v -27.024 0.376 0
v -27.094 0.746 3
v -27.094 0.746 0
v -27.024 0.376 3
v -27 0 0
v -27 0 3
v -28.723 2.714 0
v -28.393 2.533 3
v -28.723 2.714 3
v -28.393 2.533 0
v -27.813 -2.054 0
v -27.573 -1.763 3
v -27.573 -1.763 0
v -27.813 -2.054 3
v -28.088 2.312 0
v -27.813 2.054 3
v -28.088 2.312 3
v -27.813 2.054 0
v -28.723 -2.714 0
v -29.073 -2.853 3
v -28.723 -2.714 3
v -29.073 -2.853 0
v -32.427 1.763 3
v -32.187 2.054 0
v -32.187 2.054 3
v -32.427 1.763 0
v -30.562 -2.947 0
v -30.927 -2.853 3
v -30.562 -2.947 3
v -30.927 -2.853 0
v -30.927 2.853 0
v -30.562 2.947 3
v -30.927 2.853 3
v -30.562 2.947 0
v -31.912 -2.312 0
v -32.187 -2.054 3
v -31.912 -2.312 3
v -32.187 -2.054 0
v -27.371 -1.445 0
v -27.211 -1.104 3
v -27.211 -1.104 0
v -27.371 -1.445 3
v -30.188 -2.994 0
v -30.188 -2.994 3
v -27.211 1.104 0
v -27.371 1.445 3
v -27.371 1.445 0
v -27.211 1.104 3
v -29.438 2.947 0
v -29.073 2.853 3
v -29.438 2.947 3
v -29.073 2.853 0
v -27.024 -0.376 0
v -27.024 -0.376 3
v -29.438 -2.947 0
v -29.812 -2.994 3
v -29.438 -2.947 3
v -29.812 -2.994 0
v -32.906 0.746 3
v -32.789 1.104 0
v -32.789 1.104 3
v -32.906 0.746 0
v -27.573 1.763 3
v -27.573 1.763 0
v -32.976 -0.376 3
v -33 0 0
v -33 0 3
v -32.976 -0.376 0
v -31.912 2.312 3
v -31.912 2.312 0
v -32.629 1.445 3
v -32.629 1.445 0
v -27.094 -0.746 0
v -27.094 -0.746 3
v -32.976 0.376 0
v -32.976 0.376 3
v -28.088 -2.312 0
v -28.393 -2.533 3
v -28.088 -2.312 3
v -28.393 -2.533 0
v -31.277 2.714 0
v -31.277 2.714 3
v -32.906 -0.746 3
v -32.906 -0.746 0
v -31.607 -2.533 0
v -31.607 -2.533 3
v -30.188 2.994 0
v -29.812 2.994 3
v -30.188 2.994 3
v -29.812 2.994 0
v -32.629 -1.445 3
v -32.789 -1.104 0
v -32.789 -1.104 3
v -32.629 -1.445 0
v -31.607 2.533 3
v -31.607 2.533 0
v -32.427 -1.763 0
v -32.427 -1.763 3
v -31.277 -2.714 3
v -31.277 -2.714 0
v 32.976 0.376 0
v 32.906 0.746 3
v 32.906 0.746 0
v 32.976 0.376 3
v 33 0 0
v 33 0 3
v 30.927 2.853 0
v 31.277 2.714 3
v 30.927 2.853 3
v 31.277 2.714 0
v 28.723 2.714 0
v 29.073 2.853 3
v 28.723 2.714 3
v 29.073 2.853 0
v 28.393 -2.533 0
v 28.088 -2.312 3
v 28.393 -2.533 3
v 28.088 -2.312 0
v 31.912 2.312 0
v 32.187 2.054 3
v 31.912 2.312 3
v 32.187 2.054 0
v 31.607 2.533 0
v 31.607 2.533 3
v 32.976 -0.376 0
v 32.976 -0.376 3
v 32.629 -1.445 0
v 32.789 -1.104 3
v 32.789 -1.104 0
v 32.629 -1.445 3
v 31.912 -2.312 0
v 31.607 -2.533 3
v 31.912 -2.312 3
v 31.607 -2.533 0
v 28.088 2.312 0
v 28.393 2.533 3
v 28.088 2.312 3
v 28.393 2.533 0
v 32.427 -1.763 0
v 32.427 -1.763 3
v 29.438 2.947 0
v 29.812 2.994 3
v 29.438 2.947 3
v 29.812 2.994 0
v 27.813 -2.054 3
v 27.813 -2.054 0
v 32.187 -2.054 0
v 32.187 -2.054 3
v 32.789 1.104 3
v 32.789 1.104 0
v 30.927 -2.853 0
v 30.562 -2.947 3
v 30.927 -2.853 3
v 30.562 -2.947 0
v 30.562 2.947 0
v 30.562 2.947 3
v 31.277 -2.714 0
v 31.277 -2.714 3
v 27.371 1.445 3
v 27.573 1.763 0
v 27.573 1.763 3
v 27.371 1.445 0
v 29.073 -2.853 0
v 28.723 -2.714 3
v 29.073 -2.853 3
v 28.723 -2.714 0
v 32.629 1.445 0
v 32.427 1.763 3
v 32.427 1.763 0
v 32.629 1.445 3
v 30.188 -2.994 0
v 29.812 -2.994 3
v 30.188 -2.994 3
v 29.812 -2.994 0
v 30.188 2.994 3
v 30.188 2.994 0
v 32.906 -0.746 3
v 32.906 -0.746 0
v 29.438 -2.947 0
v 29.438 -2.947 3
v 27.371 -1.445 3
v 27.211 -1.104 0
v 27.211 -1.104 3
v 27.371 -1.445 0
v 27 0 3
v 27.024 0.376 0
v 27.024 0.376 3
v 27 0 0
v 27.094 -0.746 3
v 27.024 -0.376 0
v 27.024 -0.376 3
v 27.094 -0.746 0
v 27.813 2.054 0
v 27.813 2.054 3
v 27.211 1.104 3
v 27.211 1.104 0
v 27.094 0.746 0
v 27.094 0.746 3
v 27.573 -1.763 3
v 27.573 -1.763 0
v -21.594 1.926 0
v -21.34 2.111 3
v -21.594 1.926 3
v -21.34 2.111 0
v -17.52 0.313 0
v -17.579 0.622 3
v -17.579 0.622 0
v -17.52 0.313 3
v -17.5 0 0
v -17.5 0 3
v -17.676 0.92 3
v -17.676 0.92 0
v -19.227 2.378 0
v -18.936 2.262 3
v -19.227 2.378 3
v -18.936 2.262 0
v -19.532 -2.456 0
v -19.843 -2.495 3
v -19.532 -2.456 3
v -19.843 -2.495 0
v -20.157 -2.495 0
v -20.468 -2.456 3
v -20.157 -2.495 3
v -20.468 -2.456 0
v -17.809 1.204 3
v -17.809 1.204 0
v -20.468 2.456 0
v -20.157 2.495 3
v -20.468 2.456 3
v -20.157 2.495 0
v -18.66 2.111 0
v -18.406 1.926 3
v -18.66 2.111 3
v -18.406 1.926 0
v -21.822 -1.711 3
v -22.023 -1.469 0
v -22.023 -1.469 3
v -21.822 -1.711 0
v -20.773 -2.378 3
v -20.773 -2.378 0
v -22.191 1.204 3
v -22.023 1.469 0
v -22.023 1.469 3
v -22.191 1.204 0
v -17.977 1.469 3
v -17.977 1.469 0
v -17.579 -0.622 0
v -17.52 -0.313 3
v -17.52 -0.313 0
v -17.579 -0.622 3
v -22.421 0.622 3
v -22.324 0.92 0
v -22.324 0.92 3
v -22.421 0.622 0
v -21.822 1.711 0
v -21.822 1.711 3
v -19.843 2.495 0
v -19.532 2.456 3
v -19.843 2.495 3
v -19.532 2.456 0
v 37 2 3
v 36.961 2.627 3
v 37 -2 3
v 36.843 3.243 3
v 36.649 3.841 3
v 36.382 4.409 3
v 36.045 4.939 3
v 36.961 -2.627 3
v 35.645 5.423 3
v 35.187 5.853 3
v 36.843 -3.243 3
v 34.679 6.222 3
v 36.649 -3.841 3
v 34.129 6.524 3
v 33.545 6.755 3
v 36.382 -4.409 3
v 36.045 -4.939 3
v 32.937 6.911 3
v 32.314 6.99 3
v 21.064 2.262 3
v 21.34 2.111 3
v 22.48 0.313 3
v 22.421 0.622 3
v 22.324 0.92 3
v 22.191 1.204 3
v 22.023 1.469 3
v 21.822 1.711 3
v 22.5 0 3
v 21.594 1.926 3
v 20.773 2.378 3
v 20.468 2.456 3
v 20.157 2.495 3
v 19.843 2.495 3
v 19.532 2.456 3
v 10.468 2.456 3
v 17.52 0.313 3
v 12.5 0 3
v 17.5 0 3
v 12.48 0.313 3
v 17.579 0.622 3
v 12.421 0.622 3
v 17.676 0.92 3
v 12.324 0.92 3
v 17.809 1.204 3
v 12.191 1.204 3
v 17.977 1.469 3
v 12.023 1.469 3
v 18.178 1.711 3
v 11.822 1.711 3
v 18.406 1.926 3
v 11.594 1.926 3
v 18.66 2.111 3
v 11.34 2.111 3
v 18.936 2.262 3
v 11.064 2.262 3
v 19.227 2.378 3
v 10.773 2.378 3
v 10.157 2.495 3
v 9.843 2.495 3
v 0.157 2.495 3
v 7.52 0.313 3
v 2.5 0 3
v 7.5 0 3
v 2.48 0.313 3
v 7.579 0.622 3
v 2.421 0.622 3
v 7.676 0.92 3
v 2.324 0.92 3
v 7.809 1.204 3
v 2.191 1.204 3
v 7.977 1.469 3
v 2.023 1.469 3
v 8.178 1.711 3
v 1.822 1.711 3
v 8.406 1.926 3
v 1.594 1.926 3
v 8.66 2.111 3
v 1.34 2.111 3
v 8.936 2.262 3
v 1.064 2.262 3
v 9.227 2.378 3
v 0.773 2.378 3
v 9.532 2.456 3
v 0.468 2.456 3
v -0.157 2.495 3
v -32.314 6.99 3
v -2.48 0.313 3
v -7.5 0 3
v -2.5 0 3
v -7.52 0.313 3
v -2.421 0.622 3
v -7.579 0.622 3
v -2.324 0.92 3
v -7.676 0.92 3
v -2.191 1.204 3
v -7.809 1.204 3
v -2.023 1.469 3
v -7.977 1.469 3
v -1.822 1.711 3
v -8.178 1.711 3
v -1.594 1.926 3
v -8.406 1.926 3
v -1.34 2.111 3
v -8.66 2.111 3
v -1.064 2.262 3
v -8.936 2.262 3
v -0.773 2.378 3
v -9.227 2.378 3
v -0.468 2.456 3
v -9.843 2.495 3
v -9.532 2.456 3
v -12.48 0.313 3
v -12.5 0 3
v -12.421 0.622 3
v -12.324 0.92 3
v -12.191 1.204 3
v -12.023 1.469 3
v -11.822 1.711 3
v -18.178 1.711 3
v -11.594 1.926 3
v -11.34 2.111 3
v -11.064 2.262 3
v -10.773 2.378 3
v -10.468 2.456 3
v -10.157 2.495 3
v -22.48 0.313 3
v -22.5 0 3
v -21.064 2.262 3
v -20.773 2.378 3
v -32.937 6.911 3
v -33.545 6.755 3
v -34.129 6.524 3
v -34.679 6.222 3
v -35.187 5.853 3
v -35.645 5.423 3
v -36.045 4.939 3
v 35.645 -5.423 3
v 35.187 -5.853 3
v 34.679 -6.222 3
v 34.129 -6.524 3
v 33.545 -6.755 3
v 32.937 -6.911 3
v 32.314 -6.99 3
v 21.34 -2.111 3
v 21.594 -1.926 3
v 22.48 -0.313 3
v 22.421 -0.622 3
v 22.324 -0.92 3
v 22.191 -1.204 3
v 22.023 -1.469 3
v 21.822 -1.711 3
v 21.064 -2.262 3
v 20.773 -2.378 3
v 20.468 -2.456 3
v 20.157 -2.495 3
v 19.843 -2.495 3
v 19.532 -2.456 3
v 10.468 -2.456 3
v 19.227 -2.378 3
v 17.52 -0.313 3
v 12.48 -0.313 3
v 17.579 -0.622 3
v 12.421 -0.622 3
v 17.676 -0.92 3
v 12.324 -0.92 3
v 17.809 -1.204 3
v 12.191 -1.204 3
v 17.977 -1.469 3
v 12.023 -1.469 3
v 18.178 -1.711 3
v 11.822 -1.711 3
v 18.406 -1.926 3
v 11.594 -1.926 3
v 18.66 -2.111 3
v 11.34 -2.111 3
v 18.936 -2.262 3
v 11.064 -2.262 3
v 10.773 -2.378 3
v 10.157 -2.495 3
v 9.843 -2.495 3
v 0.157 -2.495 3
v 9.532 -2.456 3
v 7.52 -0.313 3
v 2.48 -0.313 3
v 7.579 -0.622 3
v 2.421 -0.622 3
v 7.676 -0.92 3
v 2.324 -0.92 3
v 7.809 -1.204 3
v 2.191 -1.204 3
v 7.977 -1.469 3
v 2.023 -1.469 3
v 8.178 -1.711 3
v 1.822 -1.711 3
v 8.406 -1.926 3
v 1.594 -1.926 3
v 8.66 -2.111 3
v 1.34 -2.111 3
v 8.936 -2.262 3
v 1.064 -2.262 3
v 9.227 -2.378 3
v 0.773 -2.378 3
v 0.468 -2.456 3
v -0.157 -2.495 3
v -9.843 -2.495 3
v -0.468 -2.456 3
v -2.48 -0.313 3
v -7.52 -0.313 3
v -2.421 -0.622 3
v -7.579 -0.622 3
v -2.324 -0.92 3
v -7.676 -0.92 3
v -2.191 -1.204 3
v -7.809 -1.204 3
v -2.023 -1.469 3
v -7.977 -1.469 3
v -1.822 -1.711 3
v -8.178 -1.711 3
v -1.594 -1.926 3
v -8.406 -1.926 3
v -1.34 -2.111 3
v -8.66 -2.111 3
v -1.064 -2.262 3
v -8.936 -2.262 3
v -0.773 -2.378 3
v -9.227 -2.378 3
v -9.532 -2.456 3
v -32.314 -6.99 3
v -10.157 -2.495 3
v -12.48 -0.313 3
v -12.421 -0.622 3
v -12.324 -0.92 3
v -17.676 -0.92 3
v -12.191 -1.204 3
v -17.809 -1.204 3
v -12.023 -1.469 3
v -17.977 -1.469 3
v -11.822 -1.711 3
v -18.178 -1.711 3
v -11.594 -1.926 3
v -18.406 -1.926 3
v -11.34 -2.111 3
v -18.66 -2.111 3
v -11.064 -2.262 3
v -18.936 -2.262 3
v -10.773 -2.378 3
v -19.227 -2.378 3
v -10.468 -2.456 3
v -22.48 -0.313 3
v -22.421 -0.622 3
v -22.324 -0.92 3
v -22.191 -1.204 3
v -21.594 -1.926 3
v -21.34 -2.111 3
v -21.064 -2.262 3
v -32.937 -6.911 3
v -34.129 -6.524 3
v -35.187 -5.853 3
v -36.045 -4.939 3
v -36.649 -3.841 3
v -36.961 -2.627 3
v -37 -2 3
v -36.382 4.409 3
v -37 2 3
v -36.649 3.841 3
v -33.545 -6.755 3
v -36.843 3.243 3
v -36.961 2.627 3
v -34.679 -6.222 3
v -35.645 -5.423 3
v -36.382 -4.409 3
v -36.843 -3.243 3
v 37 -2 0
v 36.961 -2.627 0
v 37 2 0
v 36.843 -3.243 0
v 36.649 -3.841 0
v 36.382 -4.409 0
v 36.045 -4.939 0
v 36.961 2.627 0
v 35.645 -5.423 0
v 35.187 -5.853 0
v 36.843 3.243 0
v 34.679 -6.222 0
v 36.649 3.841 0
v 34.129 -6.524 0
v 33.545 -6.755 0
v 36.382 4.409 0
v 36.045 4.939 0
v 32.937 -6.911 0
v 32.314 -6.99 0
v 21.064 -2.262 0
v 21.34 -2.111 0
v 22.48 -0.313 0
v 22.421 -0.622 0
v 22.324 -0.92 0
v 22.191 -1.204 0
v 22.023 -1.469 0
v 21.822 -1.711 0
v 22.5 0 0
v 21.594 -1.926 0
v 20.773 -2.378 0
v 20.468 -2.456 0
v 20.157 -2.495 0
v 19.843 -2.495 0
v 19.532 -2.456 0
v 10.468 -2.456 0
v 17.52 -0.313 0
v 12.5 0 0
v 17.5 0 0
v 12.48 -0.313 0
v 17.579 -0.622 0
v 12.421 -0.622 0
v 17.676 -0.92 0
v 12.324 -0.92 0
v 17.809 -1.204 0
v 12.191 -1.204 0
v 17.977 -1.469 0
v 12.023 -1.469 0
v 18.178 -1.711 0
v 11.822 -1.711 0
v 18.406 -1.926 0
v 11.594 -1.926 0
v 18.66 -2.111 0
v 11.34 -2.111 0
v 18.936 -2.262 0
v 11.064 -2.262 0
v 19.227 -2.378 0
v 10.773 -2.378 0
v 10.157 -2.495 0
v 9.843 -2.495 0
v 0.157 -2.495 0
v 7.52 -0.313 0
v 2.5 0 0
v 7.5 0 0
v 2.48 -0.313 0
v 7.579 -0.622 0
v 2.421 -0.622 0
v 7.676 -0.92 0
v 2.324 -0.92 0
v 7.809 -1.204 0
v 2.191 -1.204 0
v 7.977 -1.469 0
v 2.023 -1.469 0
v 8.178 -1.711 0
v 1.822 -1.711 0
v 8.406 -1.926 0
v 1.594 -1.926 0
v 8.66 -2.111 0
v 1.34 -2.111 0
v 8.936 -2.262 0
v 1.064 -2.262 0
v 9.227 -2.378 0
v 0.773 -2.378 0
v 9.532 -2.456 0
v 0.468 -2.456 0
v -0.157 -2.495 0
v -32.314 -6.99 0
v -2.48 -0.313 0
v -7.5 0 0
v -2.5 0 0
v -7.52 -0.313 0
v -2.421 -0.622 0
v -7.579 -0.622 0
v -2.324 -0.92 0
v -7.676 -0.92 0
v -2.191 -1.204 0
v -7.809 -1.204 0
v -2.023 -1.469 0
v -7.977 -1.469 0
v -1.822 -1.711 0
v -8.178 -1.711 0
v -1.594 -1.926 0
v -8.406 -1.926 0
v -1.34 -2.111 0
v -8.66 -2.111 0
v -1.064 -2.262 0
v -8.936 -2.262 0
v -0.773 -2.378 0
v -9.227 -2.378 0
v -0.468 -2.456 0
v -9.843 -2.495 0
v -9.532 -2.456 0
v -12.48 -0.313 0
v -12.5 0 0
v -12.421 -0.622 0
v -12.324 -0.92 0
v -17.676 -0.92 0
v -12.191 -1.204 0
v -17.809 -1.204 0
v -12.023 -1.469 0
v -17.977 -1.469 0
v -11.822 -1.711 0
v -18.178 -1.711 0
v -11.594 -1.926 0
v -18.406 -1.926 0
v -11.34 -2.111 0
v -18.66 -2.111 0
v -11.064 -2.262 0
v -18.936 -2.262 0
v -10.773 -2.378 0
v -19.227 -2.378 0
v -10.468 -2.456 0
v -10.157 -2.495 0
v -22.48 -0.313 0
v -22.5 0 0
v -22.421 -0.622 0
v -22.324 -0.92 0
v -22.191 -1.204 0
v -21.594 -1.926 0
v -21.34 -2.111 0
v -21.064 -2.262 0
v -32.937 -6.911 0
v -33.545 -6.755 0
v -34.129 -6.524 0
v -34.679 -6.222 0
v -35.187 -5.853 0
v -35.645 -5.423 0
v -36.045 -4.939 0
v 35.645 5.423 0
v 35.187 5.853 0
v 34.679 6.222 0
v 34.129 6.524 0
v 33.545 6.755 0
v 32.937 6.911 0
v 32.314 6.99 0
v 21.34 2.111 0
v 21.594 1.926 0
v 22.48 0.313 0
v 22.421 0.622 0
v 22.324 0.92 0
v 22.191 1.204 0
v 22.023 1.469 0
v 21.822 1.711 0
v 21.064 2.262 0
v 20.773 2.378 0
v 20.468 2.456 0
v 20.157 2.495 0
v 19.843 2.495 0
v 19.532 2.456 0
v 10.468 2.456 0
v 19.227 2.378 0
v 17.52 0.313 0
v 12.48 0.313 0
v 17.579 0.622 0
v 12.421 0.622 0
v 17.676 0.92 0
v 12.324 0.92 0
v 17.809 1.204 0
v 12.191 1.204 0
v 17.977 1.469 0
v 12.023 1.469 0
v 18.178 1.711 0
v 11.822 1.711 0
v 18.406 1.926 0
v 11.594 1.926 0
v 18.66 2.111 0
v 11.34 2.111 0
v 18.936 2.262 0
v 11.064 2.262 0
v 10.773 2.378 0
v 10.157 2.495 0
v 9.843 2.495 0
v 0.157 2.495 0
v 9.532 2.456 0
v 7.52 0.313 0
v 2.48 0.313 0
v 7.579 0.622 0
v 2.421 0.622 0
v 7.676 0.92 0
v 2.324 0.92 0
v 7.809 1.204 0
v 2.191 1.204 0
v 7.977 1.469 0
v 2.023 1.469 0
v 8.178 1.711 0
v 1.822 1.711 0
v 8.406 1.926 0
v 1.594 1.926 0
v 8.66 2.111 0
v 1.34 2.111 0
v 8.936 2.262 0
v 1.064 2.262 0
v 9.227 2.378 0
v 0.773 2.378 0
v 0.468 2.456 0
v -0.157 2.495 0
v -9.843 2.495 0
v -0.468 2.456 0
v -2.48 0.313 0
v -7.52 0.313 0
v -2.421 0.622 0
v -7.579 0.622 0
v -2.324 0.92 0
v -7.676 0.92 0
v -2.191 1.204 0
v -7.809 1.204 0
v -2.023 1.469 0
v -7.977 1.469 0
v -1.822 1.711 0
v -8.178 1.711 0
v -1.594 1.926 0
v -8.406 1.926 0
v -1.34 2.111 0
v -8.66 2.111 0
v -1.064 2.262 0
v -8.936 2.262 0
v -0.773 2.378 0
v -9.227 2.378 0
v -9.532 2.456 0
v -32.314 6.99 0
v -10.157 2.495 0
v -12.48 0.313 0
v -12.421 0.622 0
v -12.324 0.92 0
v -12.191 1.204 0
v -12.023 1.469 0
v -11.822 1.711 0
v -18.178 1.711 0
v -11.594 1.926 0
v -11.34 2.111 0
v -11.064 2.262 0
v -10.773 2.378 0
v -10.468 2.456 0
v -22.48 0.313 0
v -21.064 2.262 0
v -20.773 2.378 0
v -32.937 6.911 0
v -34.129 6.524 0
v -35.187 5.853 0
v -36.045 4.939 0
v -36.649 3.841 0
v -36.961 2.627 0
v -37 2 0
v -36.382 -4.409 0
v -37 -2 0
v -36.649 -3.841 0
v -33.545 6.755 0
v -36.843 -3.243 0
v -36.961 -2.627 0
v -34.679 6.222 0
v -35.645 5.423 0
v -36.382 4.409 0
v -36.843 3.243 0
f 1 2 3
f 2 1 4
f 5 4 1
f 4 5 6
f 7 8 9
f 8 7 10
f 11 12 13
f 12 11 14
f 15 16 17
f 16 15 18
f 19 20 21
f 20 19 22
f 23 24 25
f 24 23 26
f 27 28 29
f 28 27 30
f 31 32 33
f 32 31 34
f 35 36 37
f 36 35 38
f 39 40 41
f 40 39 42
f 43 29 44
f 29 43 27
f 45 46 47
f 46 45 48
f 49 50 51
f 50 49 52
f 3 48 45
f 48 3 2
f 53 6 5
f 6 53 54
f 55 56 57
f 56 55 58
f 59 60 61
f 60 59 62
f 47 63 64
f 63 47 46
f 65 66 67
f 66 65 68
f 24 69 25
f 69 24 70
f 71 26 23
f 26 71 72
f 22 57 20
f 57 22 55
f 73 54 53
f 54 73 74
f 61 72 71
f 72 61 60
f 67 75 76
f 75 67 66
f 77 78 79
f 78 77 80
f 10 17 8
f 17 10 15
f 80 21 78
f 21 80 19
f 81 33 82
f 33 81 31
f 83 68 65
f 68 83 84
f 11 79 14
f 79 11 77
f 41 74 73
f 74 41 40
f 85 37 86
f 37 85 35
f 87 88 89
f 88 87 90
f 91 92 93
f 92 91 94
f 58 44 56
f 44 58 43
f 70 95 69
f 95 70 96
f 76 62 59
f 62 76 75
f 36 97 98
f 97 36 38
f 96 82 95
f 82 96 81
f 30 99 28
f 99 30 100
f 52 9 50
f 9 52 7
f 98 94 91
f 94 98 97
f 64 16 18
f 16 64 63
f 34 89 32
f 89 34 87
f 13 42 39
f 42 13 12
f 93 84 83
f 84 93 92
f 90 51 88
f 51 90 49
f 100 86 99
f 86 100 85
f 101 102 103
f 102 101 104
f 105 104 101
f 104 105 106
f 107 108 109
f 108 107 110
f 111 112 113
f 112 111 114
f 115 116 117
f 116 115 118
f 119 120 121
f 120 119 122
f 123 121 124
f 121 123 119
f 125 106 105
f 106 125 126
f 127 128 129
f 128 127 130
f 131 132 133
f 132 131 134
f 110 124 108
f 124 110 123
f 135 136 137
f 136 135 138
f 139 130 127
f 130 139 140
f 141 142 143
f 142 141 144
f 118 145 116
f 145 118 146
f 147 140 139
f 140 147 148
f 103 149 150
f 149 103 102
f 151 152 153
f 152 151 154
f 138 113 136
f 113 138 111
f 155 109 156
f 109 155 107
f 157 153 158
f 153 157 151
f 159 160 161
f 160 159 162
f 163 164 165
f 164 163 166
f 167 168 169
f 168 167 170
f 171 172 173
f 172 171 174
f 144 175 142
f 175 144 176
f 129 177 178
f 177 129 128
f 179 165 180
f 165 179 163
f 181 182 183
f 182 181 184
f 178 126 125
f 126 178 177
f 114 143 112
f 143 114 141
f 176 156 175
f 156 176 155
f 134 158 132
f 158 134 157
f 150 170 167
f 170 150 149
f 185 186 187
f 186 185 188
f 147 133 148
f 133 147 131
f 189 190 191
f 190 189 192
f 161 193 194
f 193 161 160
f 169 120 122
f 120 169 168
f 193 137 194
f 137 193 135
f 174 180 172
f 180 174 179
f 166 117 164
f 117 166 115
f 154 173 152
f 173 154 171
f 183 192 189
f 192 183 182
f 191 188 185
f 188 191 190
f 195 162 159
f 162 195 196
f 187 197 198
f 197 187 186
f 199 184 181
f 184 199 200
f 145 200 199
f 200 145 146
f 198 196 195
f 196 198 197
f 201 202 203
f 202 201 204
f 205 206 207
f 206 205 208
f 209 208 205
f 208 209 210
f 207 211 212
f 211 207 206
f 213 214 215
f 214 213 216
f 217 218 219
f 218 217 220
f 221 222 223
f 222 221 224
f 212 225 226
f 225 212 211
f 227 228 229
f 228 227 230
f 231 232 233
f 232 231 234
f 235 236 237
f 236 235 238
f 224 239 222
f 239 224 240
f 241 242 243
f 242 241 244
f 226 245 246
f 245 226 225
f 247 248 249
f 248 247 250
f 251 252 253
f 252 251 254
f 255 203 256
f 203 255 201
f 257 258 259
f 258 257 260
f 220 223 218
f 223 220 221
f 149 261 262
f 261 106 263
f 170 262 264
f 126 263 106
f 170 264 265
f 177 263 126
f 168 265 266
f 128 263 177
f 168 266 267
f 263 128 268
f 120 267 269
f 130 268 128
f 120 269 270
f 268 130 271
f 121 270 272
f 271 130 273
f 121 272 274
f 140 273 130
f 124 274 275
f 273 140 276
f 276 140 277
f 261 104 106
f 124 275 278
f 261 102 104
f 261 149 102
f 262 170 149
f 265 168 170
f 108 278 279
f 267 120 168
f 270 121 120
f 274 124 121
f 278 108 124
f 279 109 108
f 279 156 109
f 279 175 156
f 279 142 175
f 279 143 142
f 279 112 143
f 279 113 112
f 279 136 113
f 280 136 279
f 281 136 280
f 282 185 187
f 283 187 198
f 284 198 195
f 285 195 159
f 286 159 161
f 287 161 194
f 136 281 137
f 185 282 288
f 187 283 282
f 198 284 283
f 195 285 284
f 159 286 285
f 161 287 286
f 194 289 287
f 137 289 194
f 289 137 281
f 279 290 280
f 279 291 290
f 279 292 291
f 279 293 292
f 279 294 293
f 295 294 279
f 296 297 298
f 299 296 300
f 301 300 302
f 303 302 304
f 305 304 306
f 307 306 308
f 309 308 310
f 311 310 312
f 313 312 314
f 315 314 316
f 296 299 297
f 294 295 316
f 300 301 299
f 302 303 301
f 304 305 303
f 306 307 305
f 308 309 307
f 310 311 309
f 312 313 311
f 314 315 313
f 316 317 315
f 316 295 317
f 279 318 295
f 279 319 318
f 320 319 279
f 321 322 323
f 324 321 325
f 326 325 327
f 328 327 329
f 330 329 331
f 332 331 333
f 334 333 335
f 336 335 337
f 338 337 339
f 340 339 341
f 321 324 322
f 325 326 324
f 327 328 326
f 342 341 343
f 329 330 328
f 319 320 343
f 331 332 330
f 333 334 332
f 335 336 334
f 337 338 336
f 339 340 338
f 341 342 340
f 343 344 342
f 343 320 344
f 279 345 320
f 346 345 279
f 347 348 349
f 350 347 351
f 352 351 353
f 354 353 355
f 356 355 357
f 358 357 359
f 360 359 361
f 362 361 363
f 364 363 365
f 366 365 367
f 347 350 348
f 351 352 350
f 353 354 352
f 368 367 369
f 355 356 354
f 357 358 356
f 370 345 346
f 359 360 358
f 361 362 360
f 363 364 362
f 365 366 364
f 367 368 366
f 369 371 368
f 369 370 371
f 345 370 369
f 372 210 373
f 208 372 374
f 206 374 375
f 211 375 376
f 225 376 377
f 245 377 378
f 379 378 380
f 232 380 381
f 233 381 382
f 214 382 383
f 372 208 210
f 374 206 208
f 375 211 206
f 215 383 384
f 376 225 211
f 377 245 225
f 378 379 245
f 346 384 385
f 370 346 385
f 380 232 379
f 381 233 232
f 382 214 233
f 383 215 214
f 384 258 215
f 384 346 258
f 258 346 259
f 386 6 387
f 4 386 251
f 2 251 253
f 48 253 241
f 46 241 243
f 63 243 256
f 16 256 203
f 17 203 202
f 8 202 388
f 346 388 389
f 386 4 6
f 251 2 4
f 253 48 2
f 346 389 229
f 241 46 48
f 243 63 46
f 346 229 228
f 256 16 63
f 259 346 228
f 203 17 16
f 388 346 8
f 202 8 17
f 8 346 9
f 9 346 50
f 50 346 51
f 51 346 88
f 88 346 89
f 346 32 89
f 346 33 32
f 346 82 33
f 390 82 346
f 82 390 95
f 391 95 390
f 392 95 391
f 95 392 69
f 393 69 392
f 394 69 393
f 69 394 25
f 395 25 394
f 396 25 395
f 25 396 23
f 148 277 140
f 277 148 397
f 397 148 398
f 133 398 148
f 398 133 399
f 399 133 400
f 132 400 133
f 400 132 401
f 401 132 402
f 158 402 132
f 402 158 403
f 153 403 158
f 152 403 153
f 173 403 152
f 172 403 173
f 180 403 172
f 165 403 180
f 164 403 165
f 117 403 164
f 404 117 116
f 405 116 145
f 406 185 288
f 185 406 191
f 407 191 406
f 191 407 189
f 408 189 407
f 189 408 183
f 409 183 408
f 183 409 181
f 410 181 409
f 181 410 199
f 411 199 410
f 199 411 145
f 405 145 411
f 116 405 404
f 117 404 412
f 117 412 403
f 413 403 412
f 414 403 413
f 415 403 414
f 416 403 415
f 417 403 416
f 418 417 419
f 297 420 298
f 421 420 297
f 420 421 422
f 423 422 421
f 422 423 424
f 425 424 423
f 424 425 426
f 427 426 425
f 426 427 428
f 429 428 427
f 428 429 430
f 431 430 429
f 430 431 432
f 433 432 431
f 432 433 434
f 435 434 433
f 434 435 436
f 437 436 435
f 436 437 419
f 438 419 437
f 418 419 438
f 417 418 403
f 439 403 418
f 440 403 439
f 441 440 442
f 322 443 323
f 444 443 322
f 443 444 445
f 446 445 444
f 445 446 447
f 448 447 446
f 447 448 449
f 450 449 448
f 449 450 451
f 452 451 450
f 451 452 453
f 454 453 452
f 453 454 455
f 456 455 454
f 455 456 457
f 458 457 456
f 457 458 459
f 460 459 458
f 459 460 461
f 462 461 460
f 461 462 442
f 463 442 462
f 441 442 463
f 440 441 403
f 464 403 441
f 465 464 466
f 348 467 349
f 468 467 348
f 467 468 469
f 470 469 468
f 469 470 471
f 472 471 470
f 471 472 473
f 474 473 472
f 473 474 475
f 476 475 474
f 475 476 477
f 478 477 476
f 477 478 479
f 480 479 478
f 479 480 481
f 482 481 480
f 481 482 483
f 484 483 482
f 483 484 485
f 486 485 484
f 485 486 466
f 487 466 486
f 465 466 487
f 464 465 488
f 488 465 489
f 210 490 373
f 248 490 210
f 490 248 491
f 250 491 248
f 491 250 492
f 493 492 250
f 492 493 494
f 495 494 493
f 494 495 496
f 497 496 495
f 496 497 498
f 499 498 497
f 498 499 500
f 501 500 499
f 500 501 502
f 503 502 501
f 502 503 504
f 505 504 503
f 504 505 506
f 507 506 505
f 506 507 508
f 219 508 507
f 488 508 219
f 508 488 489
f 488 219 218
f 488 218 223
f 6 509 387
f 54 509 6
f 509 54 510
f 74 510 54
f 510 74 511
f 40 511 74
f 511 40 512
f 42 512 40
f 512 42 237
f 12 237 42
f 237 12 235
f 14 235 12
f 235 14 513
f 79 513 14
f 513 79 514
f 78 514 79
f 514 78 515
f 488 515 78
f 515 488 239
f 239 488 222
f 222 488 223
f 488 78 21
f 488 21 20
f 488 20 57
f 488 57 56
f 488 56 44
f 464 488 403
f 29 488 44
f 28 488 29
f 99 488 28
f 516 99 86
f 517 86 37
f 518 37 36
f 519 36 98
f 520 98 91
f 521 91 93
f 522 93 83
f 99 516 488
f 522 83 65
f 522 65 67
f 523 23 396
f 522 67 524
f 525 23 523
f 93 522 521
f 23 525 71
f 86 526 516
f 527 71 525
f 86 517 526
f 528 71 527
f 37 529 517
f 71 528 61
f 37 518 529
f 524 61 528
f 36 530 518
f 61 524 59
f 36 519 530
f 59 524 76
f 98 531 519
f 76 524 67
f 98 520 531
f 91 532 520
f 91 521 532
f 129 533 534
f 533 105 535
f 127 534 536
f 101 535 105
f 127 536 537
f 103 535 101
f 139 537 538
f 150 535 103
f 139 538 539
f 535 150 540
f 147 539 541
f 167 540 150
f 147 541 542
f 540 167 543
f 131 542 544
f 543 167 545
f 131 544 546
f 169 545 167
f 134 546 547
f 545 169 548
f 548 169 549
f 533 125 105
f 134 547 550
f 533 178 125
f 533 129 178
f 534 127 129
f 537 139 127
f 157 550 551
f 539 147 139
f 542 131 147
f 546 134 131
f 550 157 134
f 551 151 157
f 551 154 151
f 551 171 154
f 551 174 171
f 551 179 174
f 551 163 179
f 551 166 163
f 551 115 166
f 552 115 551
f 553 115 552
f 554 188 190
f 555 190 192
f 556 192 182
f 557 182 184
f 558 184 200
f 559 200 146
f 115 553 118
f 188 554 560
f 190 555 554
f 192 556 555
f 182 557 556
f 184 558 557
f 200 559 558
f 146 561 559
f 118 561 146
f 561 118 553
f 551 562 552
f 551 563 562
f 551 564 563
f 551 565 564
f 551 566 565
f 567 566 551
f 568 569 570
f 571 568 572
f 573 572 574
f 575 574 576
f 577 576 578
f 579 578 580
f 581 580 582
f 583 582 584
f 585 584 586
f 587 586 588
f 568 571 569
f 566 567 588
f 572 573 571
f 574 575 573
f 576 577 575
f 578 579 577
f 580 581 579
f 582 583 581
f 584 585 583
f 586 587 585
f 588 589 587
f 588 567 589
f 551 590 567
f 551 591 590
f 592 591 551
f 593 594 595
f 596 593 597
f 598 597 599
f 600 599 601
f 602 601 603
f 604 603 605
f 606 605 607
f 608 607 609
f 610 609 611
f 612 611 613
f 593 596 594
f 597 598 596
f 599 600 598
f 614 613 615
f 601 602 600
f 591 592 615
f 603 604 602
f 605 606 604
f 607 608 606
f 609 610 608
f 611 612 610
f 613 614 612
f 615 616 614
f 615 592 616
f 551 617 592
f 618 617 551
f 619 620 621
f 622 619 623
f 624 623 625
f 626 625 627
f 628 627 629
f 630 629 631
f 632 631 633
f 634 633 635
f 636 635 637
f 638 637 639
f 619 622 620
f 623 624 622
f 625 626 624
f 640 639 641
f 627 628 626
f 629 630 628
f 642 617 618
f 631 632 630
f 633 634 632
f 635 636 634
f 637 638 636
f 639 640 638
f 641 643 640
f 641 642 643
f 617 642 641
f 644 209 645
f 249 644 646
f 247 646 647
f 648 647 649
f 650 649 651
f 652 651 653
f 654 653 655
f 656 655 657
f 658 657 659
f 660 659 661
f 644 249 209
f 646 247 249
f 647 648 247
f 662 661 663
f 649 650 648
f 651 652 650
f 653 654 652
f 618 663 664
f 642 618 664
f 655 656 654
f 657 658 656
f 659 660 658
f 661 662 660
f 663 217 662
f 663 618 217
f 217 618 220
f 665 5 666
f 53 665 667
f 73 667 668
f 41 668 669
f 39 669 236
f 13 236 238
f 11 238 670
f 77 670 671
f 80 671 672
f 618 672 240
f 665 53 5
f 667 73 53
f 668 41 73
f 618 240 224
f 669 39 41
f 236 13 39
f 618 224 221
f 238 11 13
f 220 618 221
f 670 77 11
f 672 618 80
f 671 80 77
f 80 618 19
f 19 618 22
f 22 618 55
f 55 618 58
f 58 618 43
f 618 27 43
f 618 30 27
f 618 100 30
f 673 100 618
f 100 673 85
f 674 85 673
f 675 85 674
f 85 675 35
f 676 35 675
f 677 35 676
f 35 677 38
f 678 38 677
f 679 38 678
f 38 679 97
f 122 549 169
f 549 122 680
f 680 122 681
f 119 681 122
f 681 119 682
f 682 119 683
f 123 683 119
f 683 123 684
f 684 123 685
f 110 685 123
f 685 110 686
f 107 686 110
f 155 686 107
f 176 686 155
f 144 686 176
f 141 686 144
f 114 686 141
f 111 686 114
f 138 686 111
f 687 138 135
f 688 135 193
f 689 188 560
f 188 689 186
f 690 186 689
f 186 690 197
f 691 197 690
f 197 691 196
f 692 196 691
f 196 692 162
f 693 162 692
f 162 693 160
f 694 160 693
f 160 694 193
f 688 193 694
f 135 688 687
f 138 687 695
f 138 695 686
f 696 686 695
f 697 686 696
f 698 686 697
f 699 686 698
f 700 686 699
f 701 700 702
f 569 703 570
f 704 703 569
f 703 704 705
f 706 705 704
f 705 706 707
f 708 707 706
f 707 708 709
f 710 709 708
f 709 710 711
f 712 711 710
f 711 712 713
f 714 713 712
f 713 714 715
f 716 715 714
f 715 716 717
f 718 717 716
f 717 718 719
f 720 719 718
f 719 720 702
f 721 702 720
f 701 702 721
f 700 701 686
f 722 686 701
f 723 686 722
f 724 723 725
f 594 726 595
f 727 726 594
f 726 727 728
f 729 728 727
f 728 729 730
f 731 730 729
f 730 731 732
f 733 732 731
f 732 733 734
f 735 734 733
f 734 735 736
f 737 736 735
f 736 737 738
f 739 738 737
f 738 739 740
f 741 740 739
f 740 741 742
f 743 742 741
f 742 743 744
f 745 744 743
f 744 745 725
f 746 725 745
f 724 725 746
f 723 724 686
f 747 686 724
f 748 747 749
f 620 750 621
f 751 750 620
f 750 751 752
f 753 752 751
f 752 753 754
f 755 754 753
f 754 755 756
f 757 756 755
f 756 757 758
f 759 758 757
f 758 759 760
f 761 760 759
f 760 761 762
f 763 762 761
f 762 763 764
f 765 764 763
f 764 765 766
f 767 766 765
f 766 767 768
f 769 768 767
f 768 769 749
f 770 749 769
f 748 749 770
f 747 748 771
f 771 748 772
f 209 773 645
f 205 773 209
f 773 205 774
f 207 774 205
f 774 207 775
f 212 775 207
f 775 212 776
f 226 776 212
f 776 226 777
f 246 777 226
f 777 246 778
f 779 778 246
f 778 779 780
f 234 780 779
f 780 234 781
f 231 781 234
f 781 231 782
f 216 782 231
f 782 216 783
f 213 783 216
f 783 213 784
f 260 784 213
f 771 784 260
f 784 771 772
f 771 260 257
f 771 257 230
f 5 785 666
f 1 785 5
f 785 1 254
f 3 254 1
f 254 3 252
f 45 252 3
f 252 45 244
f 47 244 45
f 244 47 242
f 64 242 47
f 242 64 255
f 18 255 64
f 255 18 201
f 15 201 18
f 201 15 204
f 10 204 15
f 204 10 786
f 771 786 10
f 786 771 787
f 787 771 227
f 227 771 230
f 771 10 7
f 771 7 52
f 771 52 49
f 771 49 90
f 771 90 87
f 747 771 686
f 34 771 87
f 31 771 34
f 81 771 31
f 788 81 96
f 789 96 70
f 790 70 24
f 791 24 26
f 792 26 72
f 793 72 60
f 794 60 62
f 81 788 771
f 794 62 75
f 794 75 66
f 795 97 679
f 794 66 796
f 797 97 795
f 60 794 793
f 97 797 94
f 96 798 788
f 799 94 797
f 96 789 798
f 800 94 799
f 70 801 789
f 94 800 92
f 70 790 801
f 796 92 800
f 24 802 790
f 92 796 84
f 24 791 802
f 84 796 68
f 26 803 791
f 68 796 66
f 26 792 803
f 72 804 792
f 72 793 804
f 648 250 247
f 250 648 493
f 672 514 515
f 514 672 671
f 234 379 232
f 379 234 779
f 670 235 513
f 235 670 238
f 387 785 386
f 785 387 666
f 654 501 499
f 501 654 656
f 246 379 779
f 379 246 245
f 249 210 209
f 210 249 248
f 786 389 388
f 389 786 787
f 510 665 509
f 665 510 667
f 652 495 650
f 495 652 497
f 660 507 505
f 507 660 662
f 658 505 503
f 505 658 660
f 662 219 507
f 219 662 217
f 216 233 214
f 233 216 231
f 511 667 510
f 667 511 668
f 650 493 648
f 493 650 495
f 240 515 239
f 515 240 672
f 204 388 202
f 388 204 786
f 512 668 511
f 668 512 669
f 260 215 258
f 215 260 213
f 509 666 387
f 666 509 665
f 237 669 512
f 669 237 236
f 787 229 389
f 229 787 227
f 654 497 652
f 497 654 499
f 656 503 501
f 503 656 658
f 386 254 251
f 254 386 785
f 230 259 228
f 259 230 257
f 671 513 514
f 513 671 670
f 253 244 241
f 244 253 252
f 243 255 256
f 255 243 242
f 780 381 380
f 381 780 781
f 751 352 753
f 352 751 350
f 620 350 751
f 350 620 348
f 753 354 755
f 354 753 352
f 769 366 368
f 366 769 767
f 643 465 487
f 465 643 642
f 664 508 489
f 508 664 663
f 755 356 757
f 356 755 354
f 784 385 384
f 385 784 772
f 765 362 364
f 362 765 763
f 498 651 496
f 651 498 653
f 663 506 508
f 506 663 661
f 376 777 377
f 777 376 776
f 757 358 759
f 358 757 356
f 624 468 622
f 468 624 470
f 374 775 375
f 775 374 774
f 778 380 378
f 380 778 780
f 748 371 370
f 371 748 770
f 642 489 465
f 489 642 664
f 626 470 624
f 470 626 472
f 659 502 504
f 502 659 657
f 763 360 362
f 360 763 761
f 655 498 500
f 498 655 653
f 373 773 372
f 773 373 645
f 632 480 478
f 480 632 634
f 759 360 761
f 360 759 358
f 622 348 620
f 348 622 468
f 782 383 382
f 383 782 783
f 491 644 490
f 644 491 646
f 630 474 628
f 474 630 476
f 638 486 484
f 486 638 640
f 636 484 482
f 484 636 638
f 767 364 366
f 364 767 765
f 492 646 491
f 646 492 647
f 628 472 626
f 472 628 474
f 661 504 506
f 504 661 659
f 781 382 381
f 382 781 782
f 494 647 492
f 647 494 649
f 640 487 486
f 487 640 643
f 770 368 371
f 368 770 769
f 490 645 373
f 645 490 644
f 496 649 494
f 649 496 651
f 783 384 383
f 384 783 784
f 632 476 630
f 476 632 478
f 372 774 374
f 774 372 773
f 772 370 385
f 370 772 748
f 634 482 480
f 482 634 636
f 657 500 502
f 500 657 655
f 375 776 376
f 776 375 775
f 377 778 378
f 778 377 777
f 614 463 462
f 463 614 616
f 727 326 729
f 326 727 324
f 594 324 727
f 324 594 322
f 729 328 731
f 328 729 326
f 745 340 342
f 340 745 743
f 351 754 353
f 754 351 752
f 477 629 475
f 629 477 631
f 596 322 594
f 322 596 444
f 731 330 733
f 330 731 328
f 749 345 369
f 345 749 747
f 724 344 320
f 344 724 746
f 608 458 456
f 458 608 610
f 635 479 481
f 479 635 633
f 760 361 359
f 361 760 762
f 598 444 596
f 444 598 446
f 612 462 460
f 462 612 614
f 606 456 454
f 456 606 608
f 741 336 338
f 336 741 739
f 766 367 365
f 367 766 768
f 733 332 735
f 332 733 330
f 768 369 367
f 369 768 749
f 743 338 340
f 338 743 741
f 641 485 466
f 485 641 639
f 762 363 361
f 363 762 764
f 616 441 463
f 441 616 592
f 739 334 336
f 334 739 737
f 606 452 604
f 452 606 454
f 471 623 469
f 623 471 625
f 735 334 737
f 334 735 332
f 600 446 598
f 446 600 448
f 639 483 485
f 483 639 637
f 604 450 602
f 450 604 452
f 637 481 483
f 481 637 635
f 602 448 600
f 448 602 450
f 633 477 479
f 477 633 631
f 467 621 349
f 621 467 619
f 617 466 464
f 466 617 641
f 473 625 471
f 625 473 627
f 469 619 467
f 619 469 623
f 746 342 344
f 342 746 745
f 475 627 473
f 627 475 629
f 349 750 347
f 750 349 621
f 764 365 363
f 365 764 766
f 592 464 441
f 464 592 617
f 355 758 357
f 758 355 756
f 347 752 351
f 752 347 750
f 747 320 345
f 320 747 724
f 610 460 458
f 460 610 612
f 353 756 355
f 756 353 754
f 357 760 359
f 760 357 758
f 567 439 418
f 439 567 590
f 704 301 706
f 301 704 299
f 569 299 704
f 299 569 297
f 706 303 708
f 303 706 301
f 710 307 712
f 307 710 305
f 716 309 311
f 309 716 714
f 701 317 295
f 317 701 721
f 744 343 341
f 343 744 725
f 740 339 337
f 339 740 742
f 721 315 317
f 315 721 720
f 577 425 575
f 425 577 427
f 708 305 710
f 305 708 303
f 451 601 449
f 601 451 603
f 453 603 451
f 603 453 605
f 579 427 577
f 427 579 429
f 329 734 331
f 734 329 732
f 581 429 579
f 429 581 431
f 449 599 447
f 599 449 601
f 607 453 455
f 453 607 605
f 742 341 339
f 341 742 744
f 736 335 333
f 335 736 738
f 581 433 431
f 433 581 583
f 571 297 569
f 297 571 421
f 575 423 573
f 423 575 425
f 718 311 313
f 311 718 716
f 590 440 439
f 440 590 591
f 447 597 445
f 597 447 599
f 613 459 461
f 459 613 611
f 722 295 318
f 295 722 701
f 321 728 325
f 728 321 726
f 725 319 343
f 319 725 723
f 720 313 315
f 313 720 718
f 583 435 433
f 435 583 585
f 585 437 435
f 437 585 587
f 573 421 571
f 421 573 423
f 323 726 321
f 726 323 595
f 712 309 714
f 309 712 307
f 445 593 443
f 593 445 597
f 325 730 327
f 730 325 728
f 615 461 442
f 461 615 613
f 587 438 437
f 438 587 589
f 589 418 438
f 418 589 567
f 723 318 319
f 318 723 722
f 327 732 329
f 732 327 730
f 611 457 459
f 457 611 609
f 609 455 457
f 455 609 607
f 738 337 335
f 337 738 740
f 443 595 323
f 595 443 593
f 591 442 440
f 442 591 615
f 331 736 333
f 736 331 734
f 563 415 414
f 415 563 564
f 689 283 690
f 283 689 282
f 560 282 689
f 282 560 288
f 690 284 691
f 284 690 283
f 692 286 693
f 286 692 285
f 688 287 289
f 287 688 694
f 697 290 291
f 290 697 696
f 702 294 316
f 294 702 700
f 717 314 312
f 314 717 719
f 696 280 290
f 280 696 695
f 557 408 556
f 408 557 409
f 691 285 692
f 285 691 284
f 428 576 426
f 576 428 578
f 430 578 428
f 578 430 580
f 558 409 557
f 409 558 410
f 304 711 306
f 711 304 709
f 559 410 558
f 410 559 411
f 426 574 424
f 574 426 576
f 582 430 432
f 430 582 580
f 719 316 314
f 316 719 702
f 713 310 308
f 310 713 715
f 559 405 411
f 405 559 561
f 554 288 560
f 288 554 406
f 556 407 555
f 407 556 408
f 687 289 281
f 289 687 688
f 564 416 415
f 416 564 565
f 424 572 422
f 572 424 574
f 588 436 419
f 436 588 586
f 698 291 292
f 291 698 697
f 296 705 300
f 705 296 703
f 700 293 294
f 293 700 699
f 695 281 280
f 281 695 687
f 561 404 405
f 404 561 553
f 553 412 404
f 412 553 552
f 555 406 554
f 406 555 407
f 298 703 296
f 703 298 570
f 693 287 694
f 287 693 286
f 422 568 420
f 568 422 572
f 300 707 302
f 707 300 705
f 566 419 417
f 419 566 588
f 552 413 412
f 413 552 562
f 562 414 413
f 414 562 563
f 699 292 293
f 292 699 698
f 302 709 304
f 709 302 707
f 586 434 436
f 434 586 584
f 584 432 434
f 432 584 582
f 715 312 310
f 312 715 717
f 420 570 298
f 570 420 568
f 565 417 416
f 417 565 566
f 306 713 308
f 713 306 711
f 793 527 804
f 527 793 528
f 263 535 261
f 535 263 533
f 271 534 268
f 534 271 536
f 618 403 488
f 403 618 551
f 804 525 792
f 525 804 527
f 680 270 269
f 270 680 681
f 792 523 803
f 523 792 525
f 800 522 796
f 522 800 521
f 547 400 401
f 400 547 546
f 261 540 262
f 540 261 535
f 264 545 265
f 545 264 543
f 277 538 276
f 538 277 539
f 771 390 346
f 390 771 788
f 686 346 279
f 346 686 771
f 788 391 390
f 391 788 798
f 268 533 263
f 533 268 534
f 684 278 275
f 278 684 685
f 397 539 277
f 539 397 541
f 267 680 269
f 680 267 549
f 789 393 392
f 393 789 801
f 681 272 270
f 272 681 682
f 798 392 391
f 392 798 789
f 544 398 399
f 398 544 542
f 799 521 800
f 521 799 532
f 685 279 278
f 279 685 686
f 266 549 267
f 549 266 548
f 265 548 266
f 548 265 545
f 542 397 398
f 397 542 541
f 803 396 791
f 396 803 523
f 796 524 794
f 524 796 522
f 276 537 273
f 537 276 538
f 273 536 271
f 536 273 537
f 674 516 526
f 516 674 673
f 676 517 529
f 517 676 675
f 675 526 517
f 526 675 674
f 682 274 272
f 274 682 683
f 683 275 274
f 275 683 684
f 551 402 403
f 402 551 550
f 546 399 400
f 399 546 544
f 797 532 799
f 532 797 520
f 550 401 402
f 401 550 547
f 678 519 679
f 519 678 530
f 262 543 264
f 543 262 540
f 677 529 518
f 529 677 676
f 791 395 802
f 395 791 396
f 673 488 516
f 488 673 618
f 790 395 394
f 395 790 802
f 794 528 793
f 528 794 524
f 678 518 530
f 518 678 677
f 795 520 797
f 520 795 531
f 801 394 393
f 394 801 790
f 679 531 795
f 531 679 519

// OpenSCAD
$fn = 50;


difference() {
	union() {
		hull() {
			translate(v = [-32.0000000000, 2.0000000000, 0]) {
				cylinder(h = 3, r = 5);
			}
			translate(v = [32.0000000000, 2.0000000000, 0]) {
				cylinder(h = 3, r = 5);
			}
			translate(v = [-32.0000000000, -2.0000000000, 0]) {
				cylinder(h = 3, r = 5);
			}
			translate(v = [32.0000000000, -2.0000000000, 0]) {
				cylinder(h = 3, r = 5);
			}
		}
	}
	union() {
		#translate(v = [-30.0000000000, 0.0000000000, 0]) {
			cylinder(h = 3, r = 3.0000000000);
		}
		#translate(v = [30.0000000000, 0.0000000000, 0]) {
			cylinder(h = 3, r = 3.0000000000);
		}
		#translate(v = [-30.0000000000, 0.0000000000, -100.0000000000]) {
			cylinder(h = 200, r = 3.0000000000);
		}
		#translate(v = [-30.0000000000, 0.0000000000, -100.0000000000]) {
			cylinder(h = 200, r = 3.0000000000);
		}
		#translate(v = [30.0000000000, 0.0000000000, -100.0000000000]) {
			cylinder(h = 200, r = 3.0000000000);
		}
		#translate(v = [30.0000000000, 0.0000000000, -100.0000000000]) {
			cylinder(h = 200, r = 3.0000000000);
		}
		#translate(v = [-30.0000000000, 0.0000000000, 0]) {
			cylinder(h = 3, r = 1.5000000000);
		}
		#translate(v = [30.0000000000, 0.0000000000, 0]) {
			cylinder(h = 3, r = 1.5000000000);
		}
		#translate(v = [-30.0000000000, 0.0000000000, 0]) {
			cylinder(h = 3, r = 1.5000000000);
		}
		#translate(v = [30.0000000000, 0.0000000000, 0]) {
			cylinder(h = 3, r = 1.5000000000);
		}
		#translate(v = [-30.0000000000, 0.0000000000, 0]) {
			cylinder(h = 3, r = 1.5000000000);
		}
		#translate(v = [30.0000000000, 0.0000000000, 0]) {
			cylinder(h = 3, r = 1.5000000000);
		}
		#translate(v = [-20.0000000000, 0, 0]) {
			cylinder(h = 3, r = 2.5000000000);
		}
		#translate(v = [-10.0000000000, 0, 0]) {
			cylinder(h = 3, r = 2.5000000000);
		}
		#cylinder(h = 3, r = 2.5000000000);
		#translate(v = [10.0000000000, 0, 0]) {
			cylinder(h = 3, r = 2.5000000000);
		}
		#translate(v = [20.0000000000, 0, 0]) {
			cylinder(h = 3, r = 2.5000000000);
		}
	}
}
